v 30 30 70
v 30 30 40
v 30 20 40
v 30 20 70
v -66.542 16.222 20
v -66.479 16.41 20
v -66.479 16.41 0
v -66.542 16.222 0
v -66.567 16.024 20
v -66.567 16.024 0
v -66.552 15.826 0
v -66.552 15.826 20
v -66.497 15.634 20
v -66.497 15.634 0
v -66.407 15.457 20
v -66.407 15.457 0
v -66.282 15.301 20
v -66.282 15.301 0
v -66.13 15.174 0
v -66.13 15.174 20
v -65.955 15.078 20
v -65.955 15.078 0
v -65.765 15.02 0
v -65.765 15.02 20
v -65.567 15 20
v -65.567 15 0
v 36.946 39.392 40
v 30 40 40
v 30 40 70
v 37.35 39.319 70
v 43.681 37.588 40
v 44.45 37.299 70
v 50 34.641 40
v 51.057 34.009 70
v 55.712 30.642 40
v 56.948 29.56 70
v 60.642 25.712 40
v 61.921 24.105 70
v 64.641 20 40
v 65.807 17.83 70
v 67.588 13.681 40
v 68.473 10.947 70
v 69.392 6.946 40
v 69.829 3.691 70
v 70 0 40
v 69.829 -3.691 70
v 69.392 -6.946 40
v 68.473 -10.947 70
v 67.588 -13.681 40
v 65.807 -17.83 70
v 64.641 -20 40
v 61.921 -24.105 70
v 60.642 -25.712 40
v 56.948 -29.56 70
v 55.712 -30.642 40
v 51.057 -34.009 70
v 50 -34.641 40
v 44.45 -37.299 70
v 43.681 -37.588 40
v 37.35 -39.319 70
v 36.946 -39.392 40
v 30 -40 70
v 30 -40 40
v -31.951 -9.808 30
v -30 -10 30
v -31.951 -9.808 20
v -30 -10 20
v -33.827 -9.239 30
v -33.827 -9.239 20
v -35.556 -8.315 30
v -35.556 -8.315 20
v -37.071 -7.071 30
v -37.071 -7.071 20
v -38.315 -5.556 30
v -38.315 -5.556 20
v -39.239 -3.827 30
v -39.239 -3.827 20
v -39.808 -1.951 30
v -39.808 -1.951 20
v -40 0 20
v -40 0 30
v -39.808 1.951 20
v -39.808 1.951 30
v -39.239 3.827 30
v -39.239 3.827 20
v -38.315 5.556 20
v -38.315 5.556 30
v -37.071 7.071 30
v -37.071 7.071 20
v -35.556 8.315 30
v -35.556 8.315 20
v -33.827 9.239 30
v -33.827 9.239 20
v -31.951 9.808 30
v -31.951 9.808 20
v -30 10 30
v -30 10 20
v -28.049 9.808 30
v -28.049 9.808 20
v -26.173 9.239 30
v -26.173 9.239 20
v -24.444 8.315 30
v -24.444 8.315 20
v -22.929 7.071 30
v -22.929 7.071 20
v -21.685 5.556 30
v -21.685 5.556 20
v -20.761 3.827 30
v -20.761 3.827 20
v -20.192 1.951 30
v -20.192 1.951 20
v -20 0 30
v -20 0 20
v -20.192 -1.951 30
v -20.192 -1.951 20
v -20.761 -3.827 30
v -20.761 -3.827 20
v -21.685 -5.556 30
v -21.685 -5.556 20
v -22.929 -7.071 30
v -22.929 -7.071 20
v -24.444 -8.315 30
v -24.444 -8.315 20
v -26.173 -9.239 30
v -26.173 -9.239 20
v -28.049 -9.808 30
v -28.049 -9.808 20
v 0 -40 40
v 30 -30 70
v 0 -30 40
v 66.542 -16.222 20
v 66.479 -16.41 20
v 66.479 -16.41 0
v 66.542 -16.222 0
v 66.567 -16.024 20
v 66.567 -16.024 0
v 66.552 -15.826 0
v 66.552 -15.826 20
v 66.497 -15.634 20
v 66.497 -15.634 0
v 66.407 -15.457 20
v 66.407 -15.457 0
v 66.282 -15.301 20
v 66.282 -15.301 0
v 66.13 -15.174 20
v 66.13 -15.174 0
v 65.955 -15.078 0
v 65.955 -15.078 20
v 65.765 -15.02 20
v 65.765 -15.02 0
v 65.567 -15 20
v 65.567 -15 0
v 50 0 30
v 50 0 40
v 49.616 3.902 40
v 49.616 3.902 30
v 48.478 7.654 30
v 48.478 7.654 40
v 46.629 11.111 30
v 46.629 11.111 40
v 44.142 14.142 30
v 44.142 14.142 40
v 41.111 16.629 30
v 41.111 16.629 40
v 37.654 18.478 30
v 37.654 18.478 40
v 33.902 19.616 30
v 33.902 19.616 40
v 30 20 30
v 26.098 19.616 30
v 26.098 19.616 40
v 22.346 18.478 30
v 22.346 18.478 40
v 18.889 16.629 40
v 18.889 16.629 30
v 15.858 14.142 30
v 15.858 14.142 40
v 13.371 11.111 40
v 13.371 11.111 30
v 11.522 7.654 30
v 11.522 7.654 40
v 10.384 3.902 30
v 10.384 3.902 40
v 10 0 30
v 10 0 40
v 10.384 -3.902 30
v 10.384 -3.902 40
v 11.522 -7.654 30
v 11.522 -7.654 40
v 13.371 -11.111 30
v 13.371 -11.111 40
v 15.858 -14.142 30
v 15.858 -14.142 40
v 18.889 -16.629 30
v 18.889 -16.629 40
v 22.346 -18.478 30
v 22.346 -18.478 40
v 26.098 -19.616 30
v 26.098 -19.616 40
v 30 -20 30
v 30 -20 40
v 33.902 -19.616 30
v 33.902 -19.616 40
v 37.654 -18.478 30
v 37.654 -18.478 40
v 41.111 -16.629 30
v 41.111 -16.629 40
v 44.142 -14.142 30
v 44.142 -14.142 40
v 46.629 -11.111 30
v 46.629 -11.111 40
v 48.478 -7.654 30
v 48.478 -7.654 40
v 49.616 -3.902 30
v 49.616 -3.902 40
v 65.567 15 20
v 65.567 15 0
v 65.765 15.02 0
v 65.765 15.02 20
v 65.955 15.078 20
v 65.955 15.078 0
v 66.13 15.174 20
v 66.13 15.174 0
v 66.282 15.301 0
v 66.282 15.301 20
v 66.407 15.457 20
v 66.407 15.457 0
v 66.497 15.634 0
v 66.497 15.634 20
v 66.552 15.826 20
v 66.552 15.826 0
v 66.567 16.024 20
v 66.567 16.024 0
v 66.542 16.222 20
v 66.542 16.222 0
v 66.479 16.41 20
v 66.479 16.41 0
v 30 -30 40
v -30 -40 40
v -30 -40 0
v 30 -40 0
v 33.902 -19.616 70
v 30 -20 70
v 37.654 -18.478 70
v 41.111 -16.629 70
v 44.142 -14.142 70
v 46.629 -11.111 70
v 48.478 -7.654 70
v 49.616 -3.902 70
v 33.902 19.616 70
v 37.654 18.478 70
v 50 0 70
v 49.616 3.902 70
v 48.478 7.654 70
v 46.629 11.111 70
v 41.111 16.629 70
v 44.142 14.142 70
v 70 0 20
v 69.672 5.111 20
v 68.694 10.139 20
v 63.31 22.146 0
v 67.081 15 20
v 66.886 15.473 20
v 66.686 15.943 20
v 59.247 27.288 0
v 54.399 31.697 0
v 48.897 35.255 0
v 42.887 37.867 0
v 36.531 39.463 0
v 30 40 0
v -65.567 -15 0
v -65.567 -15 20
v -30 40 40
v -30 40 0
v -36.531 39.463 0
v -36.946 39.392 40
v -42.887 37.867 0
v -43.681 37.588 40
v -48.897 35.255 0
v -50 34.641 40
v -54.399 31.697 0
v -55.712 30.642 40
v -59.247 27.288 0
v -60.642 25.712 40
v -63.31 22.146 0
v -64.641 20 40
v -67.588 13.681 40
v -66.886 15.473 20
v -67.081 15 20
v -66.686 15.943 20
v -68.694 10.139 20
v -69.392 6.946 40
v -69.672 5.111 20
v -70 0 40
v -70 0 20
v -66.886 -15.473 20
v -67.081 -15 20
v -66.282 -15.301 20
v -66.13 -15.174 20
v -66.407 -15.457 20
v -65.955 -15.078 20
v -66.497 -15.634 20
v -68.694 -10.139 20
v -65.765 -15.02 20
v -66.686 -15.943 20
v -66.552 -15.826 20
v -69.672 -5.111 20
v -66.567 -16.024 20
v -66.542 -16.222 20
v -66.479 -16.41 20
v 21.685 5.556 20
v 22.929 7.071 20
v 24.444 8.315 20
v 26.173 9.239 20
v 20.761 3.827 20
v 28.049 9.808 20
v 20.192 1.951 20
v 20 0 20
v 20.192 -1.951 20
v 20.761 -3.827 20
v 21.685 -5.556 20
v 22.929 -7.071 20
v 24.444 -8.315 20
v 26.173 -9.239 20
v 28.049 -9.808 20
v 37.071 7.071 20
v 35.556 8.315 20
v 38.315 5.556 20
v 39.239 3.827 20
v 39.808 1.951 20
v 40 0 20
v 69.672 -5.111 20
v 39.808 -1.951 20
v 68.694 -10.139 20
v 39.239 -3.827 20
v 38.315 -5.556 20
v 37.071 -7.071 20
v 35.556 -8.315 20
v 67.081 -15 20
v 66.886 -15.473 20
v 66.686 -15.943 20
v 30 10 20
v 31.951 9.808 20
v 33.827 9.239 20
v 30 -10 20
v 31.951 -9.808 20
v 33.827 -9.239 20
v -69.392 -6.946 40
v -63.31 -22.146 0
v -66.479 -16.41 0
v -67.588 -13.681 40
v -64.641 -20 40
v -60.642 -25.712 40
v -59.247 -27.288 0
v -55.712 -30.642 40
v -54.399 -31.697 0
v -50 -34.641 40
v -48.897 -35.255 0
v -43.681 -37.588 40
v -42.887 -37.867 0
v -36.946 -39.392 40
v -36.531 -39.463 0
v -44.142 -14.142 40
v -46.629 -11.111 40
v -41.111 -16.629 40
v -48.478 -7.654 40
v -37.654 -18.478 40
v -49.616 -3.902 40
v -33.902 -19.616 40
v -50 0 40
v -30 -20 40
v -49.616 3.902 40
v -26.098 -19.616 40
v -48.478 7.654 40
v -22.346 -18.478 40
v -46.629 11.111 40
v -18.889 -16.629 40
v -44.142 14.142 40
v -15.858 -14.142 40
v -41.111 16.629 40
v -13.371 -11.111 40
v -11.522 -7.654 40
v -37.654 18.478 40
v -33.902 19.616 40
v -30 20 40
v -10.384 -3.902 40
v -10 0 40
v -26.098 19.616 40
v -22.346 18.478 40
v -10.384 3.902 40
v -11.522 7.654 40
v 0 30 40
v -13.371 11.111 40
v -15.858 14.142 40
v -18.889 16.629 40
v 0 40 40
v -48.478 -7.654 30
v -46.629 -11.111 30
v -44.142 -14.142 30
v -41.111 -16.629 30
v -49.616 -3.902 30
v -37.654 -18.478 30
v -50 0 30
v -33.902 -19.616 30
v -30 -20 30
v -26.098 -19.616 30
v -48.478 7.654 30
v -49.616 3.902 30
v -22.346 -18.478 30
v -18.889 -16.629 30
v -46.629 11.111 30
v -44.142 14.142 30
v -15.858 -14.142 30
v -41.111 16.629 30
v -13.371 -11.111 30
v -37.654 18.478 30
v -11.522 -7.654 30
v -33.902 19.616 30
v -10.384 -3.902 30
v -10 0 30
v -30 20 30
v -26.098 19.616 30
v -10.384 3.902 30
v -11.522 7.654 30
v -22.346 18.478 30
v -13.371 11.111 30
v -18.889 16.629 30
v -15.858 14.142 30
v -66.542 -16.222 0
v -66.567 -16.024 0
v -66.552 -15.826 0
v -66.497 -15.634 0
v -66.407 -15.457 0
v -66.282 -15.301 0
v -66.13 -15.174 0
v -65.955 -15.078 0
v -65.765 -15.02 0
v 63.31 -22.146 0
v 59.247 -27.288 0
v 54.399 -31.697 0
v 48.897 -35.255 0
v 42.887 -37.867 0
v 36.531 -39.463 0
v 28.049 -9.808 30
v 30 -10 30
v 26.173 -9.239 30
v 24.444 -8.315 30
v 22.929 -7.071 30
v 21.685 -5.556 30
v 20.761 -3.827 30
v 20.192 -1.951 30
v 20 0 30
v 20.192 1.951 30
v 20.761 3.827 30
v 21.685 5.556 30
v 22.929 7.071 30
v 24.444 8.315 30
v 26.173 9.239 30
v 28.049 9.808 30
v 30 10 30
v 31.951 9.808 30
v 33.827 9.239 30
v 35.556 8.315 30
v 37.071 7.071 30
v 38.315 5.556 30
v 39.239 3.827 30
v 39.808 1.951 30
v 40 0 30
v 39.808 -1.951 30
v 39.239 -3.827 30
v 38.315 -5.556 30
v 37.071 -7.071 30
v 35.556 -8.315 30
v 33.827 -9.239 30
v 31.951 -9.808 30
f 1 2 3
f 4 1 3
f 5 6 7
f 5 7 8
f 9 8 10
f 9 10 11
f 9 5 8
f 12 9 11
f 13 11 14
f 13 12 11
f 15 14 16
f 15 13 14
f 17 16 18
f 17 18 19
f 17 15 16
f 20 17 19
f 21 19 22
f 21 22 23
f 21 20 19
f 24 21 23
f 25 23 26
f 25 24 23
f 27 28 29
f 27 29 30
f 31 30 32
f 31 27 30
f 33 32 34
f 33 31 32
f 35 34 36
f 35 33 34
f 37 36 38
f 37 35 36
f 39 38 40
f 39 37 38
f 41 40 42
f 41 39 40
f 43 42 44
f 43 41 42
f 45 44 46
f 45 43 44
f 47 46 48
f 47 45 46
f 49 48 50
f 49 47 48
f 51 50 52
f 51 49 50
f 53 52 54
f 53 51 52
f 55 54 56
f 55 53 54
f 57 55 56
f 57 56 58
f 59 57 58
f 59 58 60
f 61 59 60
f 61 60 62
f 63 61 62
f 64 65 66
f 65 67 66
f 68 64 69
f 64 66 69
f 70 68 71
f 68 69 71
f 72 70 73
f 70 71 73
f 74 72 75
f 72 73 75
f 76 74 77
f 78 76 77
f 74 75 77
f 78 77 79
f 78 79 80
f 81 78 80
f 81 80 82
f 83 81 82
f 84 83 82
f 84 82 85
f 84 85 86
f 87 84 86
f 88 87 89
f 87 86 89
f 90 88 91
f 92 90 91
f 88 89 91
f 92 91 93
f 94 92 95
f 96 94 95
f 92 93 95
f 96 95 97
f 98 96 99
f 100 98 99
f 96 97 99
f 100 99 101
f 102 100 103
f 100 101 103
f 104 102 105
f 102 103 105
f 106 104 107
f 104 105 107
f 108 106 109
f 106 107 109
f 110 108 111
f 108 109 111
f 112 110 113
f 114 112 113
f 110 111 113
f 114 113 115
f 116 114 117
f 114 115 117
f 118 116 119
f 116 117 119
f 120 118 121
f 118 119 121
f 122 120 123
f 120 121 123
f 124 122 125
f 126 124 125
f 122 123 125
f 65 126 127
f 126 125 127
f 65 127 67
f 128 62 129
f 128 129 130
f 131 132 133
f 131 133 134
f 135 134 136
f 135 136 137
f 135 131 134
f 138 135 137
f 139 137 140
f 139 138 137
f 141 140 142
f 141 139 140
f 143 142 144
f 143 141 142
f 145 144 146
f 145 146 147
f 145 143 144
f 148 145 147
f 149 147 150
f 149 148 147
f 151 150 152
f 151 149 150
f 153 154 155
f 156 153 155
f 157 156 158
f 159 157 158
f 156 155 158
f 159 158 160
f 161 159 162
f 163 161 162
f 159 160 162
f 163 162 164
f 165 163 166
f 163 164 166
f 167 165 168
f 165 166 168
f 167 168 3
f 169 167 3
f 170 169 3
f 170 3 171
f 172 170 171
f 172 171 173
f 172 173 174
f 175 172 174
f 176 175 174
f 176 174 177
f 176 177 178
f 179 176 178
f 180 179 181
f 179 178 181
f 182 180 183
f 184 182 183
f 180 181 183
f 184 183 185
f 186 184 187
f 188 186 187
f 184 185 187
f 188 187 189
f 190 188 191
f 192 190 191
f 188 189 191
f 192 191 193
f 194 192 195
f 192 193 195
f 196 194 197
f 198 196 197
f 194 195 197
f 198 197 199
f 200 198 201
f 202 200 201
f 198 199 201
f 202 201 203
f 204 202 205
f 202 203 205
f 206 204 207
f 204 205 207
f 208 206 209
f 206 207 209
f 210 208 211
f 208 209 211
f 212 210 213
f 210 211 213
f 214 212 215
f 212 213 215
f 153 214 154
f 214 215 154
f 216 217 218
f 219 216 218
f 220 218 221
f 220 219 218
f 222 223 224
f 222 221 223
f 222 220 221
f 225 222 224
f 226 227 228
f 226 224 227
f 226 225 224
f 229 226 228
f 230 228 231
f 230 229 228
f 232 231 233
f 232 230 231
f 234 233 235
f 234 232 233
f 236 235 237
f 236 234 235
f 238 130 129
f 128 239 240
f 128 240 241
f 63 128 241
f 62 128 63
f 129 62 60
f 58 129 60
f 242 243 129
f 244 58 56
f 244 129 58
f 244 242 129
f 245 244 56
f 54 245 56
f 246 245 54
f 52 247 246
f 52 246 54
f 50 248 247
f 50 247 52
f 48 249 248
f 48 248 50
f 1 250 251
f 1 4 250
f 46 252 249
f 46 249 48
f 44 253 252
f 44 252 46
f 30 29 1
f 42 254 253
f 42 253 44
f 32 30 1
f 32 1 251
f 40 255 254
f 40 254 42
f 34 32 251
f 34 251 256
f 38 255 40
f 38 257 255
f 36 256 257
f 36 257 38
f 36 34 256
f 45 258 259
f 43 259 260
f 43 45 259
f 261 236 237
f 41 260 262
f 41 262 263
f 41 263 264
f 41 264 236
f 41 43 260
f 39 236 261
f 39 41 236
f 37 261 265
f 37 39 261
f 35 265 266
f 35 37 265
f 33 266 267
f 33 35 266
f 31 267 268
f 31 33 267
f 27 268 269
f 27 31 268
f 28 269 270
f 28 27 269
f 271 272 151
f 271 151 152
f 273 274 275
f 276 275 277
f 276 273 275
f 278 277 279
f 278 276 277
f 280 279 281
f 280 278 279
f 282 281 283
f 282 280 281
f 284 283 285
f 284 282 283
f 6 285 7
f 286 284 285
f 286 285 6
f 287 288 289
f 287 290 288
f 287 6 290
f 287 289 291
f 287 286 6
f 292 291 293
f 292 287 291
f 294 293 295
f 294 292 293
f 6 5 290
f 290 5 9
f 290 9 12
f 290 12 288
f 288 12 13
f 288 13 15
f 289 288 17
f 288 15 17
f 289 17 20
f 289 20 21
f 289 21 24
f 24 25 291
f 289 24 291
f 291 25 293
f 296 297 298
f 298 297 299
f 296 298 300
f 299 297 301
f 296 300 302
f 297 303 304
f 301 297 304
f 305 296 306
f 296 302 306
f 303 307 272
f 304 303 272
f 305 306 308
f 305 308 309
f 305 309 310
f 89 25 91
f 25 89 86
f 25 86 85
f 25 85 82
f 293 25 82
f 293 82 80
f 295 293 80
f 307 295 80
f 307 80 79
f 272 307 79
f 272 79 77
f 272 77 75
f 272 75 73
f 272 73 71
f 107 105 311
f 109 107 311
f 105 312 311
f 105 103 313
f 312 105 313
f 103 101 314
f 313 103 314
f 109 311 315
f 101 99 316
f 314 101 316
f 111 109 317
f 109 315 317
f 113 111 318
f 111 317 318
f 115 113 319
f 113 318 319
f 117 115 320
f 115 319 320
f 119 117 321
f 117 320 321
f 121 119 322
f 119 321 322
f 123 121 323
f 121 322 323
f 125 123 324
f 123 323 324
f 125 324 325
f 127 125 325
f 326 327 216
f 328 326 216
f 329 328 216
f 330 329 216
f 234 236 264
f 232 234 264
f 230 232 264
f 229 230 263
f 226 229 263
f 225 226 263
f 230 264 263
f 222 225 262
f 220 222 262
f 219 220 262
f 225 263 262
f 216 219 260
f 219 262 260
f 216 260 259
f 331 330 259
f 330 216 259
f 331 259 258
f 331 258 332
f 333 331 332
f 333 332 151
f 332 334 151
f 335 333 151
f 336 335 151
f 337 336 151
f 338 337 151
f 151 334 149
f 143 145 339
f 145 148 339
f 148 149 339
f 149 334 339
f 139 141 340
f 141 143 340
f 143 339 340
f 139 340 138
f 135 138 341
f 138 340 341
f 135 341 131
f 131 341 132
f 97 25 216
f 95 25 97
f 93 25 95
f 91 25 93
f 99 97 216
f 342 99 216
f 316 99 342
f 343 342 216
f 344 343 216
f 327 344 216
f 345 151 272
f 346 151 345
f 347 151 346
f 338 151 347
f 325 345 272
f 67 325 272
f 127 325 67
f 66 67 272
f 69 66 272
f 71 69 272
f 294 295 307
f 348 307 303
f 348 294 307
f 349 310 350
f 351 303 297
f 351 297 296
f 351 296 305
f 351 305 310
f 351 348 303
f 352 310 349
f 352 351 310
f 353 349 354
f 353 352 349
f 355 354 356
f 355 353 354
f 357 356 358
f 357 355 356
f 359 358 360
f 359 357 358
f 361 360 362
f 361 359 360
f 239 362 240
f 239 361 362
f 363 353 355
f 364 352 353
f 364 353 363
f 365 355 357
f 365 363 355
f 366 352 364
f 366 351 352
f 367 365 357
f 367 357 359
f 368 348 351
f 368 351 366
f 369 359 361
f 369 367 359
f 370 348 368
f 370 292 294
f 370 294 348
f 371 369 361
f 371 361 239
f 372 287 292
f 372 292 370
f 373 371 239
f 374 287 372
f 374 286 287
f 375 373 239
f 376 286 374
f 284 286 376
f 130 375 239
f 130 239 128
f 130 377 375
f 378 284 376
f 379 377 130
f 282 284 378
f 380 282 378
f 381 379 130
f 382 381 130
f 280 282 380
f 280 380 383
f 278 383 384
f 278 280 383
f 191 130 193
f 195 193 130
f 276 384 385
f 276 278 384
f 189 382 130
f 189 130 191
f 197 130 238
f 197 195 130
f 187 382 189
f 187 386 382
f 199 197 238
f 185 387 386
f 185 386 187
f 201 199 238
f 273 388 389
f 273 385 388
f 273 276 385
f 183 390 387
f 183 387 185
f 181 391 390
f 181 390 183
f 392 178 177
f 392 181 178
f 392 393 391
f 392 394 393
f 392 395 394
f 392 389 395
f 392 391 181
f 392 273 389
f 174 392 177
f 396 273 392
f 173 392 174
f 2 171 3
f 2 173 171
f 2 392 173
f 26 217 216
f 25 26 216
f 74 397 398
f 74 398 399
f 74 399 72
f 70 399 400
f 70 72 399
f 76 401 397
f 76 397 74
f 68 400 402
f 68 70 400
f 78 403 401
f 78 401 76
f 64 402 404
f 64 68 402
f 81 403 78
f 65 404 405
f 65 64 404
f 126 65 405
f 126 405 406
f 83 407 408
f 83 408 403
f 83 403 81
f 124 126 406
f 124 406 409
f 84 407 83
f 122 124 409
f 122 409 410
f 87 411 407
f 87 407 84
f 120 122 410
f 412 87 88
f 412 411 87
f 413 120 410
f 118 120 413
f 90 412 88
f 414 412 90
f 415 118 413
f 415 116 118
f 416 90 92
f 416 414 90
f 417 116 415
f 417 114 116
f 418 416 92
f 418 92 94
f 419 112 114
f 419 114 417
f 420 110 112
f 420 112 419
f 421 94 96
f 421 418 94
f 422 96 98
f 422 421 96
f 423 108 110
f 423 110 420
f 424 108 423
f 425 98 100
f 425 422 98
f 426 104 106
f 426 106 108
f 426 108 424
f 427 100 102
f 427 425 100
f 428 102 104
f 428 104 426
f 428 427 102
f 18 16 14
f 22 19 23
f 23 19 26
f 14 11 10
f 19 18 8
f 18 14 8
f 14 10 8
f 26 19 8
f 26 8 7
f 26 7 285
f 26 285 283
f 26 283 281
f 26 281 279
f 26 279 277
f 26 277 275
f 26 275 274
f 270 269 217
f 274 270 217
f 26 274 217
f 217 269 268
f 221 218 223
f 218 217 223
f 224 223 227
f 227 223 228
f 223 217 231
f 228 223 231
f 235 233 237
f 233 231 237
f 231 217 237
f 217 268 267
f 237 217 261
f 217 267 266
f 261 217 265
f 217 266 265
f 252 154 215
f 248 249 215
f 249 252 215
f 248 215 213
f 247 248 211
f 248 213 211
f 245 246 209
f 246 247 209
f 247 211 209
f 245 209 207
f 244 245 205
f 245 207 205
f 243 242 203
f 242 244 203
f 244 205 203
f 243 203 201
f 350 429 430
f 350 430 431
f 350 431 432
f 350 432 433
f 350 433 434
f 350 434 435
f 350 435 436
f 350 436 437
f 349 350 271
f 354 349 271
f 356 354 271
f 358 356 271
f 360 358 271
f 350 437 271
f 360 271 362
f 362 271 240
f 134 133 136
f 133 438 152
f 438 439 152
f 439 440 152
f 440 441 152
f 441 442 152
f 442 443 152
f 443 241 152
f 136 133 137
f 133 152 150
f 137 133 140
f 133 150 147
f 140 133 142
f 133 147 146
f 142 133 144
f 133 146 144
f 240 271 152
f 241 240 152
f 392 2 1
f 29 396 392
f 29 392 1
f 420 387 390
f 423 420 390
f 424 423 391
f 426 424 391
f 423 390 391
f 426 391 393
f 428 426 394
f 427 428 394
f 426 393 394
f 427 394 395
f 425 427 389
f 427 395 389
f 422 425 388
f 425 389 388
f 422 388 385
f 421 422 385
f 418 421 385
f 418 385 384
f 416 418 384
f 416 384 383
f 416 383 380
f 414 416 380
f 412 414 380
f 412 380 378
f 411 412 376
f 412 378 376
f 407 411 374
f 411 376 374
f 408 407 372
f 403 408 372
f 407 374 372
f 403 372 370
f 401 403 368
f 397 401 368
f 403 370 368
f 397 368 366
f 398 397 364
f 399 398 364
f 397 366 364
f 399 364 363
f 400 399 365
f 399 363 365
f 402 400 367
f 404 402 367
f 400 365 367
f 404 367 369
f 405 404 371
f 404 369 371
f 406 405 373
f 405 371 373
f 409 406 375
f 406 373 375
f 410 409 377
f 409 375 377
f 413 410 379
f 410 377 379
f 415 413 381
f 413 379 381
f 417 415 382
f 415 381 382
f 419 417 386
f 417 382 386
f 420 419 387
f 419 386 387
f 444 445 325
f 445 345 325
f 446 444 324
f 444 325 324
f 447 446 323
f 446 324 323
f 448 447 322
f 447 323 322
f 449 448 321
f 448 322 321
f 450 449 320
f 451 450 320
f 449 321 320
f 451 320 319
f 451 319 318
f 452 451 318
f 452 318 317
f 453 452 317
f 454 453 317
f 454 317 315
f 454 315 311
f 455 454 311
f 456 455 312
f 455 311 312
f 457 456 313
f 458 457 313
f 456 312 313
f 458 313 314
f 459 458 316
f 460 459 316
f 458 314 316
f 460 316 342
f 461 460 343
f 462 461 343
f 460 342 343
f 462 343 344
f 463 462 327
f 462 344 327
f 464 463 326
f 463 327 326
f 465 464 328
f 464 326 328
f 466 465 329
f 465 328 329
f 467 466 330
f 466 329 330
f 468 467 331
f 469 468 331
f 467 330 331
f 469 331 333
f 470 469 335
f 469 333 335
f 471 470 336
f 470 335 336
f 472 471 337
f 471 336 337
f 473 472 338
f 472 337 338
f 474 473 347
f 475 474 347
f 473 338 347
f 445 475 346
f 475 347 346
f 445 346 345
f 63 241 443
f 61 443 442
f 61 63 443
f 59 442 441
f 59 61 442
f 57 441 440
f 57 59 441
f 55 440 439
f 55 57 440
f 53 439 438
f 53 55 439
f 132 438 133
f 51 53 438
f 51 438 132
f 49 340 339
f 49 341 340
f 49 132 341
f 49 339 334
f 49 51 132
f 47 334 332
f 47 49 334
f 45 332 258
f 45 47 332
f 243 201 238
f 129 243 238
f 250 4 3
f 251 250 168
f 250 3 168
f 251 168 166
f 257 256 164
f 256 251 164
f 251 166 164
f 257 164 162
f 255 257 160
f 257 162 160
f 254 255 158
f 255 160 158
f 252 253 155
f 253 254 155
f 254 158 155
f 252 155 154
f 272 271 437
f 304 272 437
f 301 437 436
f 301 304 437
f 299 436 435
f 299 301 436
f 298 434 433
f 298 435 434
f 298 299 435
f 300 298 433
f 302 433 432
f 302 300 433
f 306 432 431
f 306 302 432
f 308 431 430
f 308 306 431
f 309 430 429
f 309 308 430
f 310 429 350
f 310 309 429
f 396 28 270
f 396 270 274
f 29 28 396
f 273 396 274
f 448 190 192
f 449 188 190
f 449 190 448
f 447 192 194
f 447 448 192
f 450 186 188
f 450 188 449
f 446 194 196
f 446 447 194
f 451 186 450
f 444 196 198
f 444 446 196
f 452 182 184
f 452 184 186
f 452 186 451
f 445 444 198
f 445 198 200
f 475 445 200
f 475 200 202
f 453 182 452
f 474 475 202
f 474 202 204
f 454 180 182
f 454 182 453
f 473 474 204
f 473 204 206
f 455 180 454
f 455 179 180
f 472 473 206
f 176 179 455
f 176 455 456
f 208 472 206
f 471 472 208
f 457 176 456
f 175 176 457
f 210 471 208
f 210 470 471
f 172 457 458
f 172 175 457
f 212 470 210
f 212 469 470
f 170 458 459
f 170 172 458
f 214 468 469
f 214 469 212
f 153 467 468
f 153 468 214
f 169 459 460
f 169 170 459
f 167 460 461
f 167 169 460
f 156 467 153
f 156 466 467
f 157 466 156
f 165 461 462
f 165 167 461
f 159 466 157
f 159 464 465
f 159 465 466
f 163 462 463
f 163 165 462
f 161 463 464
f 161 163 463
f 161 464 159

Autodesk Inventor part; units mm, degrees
ref_plane "XY Plane" through (0, 0, 0) normal (0, 0, 1) x (1, 0, 0)
sketch "Skizze1" plane through (0, 0, 0) normal (0, 0, 1) x (1, 0, 0)
  line L0 (-70, 0) -> (70, 0) construction
  line L1 (-70, 40) -> (70, 40)
  line L2 (-70, -40) -> (70, -40)
  line L3 (-70, 40) -> (-70, -40)
  line L4 (70, 40) -> (70, -40)
  line L5 (0, 0) -> (0, 9.5703) construction
  dimension "d0" = 80
  dimension "d1" = 140
extrude "Extrusion1" add sketch "Skizze1" along normal blind 40
fillet "Rundung1" radius 40 1 edges at (-70, 40, 20)
fillet "Rundung2" radius 40 1 edges at (-70, -40, 20)
fillet "Rundung3" radius 40 1 edges at (70, 40, 20)
fillet "Rundung4" radius 40 1 edges at (70, -40, 20)
sketch "Skizze4" plane through (0, 0, 40) normal (0, 0, 1) x (1, 0, 0)
  circle A0 centre (-30, 0) radius 20
  circle A1 centre (30, 0) radius 20
  line L0 (0, 0) -> (0, 40) construction
  arc A2 (30, -40) -> (30, 40) centre (30, 0) ccw projected
  line L1 (30, 40) -> (-30, 40) projected
  point P0 (70, 0)
  dimension "d10" = 40
  dimension "d11" = 40
  dimension "d12" = 60
extrude "Extrusion2" cut sketch "Skizze4" against normal blind 10
sketch "Skizze5" plane through (-30, 0, 30) normal (0, 0, 1) x (1, 0, 0)
  circle A0 centre (0, 0) radius 20 projected
  point P0 (30, 0)
hole "Bohrung1" at (-30, 0, 30) direction (0, 0, -1) diameter 20 depth 30
sketch "Skizze6" plane through (30, 0, 30) normal (0, 0, 1) x (1, 0, 0)
  circle A0 centre (0, 0) radius 20 projected
  point P0 (-30, 0)
hole "Bohrung2" at (30, 0, 30) direction (0, 0, -1) diameter 20 depth 30
sketch "Skizze7" plane through (0, 0, 40) normal (0, 0, 1) x (1, 0, 0)
  circle A0 centre (30, 0) radius 10 projected
  arc A1 (30, -40) -> (30, 40) centre (30, 0) ccw projected
  line L0 (30, 40) -> (-30, 40) projected
  arc A2 (30, -40) -> (30, 40) centre (30, 0) ccw
  circle A3 centre (30, 0) radius 20 projected
  arc A4 (30, -20) -> (30, 20) centre (30, 0) ccw
  line L1 (30, 40) -> (30, 20)
  line L2 (30, -20) -> (30, -40)
  point P0 (0, 0)
extrude "Extrusion3" add sketch "Skizze7" along normal blind 30 contours L2 A3 L1 A1
sketch "Skizze8" plane through (-30, -40, 0) normal (0, -1, 0) x (1, 0, 0)
  line L0 (60, 40) -> (60, 70) projected
  line L1 (0, 40) -> (60, 40) projected
  line L2 (60, 70) -> (30, 40)
  line L3 (60, 40) -> (30, 40)
  line L4 (60, 40) -> (60, 70) projected
  line L5 (60, 70) -> (60, 40)
  point P0 (30, 0)
  dimension "d31" = 30
extrude "Extrusion4" add sketch "Skizze8" against normal blind 10
ref_plane "Arbeitsebene1" through (0, 0, 0) normal (0, -1, 0) x (1, 0, 0)
mirror "Spiegeln2" about plane through (0, 0, 0) normal (0, -1, 0) of "Extrusion4"
ref_plane "Arbeitsebene3" through (0, 0, 0) normal (-1, 0, 0) x (0, -1, 0)
sketch "Skizze10" plane through (0, 0, 0) normal (-1, 0, 0) x (0, -1, 0)
  line L0 (40, 0) -> (-40, 0) projected
  line L1 (-15, 0) -> (-15, 20)
  line L2 (-15, 20) -> (15, 20)
  line L3 (15, 20) -> (15, 0)
  line L4 (0, 0) -> (0, 10) construction
  point P0 (15, 10)
  dimension "d36" = 30
  dimension "d37" = 20
extrude "Extrusion5" cut sketch "Skizze10" along normal through all both and the other way through all
fillet "Rundung5" radius 1 4 edges at (-67.081, -15, 10) (-67.081, 15, 10) (67.081, 15, 10) (67.081, -15, 10)
properties part number "angel" material "Stahl, galvanisiert"
